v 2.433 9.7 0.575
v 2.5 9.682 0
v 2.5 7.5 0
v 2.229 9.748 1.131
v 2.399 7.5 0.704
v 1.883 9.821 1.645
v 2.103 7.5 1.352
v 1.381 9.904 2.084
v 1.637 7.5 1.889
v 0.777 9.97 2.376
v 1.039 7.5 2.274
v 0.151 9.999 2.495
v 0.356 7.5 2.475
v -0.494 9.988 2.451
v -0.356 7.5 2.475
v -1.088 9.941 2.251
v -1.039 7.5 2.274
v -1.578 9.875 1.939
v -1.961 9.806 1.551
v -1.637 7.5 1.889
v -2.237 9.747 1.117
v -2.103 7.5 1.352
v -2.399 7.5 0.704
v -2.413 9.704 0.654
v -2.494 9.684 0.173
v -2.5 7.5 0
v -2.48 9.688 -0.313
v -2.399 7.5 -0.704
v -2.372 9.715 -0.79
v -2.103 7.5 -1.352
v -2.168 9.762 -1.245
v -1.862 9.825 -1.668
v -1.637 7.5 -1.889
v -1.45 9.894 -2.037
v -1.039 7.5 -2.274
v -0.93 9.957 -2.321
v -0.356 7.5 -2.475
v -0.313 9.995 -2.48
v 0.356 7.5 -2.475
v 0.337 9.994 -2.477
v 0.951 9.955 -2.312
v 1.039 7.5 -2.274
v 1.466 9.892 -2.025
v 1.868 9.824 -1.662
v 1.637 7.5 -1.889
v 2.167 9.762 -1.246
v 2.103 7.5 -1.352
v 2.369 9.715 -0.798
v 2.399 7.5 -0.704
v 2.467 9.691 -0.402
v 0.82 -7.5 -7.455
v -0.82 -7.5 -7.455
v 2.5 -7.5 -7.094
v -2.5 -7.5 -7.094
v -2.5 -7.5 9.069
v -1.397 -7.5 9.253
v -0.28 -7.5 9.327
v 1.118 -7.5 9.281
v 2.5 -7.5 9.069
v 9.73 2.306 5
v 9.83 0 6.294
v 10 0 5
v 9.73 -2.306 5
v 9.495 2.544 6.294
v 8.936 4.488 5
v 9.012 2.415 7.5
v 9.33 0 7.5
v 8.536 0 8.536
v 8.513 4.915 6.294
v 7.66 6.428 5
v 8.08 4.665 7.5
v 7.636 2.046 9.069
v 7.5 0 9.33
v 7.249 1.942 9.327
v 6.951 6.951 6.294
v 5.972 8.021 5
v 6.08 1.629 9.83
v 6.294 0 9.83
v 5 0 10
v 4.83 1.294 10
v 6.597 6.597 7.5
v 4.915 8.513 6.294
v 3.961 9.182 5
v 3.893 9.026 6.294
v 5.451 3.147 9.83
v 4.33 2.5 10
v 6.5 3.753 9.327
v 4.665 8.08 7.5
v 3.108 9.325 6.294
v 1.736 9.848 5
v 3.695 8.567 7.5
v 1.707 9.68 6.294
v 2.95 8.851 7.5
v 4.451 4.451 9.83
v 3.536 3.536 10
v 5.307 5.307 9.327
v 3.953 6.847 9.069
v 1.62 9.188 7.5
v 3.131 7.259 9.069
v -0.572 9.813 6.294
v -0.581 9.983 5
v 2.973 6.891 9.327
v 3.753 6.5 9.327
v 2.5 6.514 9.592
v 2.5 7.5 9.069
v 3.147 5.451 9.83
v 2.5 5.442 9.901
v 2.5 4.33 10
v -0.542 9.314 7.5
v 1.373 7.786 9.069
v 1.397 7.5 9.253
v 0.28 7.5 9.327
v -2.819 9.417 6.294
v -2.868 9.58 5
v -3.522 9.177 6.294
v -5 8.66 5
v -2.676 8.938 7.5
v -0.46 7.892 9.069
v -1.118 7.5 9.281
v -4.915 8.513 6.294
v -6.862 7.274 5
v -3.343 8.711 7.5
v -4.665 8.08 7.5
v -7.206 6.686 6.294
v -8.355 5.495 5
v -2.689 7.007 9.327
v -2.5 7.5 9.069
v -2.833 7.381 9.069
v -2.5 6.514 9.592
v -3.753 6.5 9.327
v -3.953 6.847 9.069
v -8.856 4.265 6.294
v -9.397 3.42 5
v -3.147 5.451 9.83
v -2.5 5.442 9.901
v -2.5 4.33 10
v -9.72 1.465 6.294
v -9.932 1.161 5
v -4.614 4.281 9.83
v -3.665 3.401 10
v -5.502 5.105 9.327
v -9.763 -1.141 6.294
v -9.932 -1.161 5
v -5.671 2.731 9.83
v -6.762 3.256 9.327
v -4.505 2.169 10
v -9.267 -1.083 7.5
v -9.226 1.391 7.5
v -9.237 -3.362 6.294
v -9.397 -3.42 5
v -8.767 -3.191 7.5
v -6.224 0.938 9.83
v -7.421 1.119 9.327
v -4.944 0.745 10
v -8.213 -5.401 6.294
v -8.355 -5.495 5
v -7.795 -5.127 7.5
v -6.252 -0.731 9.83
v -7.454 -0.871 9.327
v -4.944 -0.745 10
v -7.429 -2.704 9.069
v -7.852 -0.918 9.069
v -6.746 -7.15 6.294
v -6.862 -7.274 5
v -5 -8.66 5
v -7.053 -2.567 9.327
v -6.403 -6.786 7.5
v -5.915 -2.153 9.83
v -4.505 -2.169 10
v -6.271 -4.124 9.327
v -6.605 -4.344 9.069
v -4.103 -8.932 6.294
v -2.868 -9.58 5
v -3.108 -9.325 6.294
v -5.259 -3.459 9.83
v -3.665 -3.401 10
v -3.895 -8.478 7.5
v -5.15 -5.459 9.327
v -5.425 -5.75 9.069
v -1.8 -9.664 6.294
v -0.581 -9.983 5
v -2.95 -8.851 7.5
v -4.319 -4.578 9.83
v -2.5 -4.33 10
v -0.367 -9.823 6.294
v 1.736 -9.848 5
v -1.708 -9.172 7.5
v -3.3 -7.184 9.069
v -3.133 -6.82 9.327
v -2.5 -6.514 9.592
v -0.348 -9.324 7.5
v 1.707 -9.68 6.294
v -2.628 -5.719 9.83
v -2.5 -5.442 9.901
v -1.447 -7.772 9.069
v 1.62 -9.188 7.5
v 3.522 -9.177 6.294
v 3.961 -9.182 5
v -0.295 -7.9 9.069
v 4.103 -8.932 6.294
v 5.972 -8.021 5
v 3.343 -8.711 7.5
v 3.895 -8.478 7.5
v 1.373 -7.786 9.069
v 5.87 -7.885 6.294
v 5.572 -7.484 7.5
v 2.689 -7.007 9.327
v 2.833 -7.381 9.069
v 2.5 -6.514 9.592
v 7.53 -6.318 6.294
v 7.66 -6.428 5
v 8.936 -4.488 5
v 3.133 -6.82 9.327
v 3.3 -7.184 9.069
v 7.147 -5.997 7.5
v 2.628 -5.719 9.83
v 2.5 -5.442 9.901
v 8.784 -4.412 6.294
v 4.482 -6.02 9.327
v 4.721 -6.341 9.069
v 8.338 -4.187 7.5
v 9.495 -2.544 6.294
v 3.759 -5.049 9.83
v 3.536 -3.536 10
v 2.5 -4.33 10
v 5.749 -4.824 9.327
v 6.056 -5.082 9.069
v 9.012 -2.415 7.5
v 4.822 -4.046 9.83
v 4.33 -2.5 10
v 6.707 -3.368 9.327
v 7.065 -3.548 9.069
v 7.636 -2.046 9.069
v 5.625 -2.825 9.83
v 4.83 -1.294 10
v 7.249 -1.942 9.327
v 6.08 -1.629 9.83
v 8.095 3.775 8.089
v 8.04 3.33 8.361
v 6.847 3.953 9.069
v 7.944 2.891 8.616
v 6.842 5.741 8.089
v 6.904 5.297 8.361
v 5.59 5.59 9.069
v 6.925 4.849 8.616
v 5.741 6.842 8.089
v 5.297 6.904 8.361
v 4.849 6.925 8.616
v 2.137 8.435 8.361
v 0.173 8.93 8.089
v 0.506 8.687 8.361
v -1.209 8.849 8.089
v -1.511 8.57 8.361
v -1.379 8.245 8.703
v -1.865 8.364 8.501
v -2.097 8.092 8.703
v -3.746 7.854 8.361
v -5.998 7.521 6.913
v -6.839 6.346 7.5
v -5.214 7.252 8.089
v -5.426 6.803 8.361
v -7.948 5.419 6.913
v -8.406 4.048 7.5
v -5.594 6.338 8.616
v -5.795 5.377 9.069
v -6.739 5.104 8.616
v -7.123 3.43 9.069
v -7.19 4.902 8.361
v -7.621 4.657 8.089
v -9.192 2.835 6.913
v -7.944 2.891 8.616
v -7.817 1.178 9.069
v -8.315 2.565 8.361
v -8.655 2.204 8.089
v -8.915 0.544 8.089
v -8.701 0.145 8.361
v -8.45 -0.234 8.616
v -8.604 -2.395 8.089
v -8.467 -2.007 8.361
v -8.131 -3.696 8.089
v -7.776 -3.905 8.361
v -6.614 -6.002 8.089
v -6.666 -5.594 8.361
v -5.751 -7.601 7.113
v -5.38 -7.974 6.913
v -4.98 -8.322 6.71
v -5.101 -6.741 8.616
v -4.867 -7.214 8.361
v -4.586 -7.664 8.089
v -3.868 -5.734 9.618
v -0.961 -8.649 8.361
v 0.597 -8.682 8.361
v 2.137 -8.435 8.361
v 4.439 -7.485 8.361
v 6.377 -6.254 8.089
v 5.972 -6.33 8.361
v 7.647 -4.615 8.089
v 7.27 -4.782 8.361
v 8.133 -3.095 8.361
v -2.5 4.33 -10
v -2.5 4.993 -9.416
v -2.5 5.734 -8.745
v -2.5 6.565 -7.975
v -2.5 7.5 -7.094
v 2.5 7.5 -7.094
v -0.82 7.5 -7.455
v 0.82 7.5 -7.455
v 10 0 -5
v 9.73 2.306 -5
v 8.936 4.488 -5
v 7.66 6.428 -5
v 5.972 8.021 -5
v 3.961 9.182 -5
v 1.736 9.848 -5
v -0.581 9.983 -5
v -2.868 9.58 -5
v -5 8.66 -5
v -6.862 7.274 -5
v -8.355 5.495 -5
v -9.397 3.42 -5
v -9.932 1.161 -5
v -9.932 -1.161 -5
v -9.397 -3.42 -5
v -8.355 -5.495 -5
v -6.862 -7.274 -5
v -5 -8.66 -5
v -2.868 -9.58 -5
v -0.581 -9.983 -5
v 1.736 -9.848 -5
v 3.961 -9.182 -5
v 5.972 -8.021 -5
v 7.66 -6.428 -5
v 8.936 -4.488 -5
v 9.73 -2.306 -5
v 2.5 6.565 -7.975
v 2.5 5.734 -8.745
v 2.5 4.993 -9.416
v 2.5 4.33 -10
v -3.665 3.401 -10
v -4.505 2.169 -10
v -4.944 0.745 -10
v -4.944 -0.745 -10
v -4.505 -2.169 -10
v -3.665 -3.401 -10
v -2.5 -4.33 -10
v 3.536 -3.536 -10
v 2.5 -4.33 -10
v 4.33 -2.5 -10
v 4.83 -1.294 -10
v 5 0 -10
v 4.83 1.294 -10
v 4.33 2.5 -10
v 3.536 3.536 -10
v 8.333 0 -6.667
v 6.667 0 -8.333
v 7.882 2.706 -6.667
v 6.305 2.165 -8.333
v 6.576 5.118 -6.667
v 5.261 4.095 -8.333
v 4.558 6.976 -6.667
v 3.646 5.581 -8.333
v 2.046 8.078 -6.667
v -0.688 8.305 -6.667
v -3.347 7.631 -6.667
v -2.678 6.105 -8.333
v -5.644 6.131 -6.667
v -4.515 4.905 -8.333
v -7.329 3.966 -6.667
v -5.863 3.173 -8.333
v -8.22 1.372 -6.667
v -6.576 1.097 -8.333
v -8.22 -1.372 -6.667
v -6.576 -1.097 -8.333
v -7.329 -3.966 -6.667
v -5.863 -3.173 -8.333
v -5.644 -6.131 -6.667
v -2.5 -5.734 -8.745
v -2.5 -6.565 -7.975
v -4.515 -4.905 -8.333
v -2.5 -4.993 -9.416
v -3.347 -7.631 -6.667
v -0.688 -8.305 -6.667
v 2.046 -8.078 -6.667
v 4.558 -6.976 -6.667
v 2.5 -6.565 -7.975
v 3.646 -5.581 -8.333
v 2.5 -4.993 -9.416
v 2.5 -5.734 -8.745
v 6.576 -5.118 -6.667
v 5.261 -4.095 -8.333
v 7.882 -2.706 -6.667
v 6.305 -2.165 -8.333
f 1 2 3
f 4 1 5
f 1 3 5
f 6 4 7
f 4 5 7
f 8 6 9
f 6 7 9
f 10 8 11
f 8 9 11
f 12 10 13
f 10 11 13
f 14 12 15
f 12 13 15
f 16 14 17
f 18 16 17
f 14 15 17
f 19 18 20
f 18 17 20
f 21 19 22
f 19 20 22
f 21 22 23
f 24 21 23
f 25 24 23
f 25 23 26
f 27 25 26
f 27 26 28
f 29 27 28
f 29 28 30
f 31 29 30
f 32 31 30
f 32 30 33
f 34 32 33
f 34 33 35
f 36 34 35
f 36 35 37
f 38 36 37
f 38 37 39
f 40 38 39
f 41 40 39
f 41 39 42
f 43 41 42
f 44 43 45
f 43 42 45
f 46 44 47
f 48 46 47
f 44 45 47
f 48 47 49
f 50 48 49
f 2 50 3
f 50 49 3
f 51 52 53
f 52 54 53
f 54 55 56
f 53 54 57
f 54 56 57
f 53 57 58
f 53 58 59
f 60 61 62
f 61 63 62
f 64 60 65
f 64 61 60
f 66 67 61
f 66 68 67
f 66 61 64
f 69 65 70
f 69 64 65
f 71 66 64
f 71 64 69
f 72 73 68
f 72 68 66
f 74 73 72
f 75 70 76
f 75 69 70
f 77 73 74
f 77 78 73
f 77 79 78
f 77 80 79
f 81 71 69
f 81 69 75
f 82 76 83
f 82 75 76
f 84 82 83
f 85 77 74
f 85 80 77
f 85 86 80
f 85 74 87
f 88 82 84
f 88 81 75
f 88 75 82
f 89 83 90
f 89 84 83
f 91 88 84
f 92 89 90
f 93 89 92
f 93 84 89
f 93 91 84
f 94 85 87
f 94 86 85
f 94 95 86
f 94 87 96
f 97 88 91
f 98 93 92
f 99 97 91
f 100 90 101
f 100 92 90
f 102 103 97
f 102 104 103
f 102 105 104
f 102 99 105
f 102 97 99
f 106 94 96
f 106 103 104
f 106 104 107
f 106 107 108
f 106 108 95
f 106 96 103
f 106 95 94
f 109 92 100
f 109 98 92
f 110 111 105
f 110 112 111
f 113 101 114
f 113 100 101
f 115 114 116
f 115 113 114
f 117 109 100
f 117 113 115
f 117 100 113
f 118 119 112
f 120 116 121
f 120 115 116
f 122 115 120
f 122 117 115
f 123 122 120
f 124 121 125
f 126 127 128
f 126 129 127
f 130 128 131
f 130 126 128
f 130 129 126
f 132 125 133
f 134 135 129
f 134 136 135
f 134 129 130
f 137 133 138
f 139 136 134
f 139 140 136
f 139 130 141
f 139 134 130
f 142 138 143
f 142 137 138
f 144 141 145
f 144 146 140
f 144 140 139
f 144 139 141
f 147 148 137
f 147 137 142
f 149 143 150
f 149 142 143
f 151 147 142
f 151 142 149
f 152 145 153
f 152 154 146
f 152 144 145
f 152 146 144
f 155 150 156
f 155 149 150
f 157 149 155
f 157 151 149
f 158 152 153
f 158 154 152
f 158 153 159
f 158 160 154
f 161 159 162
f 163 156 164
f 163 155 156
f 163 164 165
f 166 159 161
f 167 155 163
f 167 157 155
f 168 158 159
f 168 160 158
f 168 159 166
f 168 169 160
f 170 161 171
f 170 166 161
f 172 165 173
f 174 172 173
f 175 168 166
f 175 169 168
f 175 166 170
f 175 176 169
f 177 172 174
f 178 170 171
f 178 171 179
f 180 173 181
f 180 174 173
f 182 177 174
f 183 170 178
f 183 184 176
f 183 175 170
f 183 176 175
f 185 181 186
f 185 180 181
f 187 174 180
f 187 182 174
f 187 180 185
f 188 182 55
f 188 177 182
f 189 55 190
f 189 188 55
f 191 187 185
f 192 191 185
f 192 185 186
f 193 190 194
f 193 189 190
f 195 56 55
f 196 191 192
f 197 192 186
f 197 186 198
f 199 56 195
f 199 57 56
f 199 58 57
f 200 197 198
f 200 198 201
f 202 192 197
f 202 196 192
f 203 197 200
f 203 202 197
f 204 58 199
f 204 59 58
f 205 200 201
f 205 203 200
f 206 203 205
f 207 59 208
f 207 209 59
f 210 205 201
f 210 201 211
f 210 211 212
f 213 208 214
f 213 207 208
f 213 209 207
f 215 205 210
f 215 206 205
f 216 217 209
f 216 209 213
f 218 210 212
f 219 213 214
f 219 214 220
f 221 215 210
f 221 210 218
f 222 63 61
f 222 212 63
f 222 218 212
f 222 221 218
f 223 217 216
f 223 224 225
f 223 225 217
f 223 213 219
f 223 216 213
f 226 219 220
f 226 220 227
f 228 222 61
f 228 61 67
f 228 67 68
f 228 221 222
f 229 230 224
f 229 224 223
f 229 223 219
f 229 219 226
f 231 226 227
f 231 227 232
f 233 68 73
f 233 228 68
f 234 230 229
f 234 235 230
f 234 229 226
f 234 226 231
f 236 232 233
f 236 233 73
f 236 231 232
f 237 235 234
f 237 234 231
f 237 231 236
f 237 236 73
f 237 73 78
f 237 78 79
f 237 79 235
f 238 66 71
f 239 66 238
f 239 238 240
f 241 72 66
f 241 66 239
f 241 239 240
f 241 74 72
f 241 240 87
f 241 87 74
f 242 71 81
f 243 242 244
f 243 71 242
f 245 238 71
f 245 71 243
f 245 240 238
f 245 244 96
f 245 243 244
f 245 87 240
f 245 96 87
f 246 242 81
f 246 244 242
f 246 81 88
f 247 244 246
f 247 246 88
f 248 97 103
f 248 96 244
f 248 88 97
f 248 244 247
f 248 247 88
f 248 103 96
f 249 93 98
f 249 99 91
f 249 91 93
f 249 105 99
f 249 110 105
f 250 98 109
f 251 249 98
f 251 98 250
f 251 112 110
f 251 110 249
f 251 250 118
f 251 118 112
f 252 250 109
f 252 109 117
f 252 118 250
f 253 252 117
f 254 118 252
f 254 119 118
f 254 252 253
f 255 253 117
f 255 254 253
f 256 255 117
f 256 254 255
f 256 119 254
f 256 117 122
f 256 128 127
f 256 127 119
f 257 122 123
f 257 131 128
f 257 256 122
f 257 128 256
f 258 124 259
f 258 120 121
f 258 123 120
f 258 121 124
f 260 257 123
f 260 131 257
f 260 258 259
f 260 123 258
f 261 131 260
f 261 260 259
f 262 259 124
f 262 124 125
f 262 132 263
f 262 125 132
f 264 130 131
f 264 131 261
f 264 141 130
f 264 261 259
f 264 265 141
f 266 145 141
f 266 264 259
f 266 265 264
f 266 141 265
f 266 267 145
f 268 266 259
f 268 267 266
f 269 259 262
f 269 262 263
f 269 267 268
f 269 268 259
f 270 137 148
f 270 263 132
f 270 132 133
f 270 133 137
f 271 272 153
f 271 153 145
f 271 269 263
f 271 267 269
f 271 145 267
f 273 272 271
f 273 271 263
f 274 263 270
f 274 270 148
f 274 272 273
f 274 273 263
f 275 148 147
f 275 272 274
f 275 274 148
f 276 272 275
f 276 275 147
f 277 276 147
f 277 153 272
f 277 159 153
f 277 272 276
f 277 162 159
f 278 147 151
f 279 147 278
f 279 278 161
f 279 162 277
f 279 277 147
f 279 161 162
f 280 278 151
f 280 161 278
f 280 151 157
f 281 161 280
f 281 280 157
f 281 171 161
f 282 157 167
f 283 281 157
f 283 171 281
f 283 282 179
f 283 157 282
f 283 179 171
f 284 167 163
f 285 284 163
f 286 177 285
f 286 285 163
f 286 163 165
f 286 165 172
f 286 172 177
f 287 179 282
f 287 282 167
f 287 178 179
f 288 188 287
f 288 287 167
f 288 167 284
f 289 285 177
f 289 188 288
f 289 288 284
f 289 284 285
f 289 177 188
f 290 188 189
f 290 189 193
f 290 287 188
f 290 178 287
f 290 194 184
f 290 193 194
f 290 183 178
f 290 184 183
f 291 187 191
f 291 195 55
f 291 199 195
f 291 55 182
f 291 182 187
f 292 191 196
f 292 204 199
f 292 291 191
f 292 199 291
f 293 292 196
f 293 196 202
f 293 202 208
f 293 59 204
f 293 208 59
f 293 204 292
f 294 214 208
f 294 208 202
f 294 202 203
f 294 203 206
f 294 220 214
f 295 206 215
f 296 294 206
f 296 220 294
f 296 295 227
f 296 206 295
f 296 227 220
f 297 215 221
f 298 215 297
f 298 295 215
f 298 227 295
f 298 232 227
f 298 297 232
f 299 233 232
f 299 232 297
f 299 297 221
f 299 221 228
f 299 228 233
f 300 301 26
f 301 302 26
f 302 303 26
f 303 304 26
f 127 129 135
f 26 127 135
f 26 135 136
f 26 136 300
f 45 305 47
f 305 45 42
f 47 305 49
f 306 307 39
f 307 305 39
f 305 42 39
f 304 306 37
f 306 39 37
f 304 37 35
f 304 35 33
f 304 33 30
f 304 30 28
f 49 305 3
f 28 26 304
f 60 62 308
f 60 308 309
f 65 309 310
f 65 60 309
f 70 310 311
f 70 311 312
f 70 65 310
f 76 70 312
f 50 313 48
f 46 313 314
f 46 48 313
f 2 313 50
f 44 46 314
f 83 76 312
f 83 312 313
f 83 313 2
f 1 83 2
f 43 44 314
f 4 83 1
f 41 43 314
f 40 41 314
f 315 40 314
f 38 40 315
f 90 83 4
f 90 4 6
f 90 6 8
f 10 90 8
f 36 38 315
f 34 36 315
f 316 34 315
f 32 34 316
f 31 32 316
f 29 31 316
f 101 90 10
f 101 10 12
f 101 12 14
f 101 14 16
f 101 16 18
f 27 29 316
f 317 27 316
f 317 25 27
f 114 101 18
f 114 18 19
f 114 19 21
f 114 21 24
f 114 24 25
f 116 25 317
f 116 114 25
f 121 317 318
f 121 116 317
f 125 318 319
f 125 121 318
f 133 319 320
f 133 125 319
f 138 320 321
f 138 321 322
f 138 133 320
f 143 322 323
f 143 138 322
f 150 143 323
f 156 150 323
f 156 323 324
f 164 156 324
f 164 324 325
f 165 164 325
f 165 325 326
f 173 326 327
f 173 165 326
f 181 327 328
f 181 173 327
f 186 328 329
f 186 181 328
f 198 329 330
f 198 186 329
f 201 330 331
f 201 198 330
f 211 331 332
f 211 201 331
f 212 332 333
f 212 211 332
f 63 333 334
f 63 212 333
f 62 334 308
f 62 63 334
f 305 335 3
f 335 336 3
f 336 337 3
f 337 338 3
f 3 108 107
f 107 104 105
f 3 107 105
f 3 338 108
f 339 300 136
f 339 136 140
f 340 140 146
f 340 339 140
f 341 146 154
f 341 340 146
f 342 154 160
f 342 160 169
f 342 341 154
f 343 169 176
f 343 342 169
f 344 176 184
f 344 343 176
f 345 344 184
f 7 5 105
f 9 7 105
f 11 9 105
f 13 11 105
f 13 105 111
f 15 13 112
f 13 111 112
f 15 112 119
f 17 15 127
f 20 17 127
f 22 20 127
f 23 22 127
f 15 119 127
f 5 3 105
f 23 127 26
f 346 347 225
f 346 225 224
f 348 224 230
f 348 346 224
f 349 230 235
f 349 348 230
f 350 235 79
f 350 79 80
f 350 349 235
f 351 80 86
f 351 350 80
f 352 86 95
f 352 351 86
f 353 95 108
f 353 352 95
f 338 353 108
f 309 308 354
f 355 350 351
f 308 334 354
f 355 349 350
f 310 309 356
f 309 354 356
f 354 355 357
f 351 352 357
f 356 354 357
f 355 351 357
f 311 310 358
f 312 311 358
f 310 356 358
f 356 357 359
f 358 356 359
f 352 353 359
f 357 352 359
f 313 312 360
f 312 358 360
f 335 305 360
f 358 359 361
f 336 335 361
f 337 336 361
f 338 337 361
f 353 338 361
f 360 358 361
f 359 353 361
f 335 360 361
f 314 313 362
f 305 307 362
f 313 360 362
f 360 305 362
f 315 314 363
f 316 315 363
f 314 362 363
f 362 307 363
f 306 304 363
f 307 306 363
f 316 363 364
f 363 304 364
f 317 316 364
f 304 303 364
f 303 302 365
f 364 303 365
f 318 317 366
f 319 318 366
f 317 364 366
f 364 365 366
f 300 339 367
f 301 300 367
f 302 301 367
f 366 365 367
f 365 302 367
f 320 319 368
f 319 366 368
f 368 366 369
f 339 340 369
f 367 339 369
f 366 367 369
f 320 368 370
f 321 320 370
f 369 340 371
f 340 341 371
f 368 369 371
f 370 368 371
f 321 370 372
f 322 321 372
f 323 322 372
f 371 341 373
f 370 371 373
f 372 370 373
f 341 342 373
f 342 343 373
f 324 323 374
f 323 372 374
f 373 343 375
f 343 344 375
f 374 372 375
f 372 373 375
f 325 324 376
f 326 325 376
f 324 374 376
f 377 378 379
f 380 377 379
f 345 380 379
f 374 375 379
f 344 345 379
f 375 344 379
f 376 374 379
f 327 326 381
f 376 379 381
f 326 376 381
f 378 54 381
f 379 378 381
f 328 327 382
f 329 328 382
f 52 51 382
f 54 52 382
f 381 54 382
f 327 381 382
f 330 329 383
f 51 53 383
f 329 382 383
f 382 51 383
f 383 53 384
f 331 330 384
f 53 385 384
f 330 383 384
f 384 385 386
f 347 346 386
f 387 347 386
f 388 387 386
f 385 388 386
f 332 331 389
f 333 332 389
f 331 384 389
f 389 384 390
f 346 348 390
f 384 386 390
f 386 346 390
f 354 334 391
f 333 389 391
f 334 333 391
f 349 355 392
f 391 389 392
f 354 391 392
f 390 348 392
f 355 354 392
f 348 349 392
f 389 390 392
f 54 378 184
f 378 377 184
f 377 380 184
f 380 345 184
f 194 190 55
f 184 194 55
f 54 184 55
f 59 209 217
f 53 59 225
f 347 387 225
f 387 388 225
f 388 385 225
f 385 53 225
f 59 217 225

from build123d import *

# Parameters (mm, degrees)
F0_R     = 10
F0_R_2   = 5
F1_DEPTH = 10
F3_DEPTH = 25
F7_D     = 5
F7_DEPTH = 10.0010001


# Not quite as in the source:
# - a fillet or chamfer that OpenCascade refuses, or shapes differently, is made with other operations: its cross-section is extruded or revolved along the edge and cut away or added


with BuildPart() as f1:
    # F0 (on Top) → F1 (new body, symmetric)
    with BuildSketch(Plane.XY):
        Circle(F0_R)
        Circle(F0_R_2, mode=Mode.SUBTRACT)
    extrude(amount=F1_DEPTH, both=True)

    # F2 (on face) → F3 (cut)
    with BuildSketch(Plane.XY.offset(10)):
        with BuildLine():
            Line((2.5, -4.3301270189), (2.5, 4.3301270189))
            ThreePointArc((2.5, 4.3301270189), (0, 5), (-2.5, 4.3301270189))
            Line((-2.5, 4.3301270189), (-2.5, -4.3301270189))
            ThreePointArc((-2.5, -4.3301270189), (0, -5), (2.5, -4.3301270189))
        make_face()
        with BuildLine():
            Line((2.5, 4.3301270189), (2.5, 7.5))
            Line((2.5, 7.5), (-2.5, 7.5))
            Line((-2.5, 7.5), (-2.5, 4.3301270189))
            ThreePointArc((-2.5, 4.3301270189), (0, 5), (2.5, 4.3301270189))
        make_face()
        with BuildLine():
            Line((2.5, -7.5), (2.5, -4.3301270189))
            ThreePointArc((2.5, -4.3301270189), (0, -5), (-2.5, -4.3301270189))
            Line((-2.5, -4.3301270189), (-2.5, -7.5))
            Line((-2.5, -7.5), (2.5, -7.5))
        make_face()
    extrude(amount=-F3_DEPTH, mode=Mode.SUBTRACT)

    # F4: fillet of radius 5 on 1 edges, made by hand

    # F4_s1 → F4_t2 (revolve, cut)
    with BuildSketch(Plane.XZ):
        with BuildLine():
            ThreePointArc((10, 5), (8.5355339059, 8.5355339059), (5, 10))
            Line((5, 10), (10, 10))
            Line((10, 10), (10, 5))
        make_face()
    revolve(axis=Axis((0, 0, 10), (0, 0, 1)), mode=Mode.SUBTRACT)

    # F5: chamfer of 5 on 1 edges, made by hand

    # F5_s1 → F5_t2 (revolve, cut)
    with BuildSketch(Plane.XZ):
        Polygon((10, -5), (5, -10), (10, -10), align=None)
    revolve(axis=Axis((0, 0, -10), (0, 0, 1)), mode=Mode.SUBTRACT)

    # F7 (through all, one way)
    with BuildSketch(Plane.XZ):
        with Locations((0, 0)):
            Circle(F7_D / 2)
    extrude(amount=-F7_DEPTH, mode=Mode.SUBTRACT)


solid = f1.part
